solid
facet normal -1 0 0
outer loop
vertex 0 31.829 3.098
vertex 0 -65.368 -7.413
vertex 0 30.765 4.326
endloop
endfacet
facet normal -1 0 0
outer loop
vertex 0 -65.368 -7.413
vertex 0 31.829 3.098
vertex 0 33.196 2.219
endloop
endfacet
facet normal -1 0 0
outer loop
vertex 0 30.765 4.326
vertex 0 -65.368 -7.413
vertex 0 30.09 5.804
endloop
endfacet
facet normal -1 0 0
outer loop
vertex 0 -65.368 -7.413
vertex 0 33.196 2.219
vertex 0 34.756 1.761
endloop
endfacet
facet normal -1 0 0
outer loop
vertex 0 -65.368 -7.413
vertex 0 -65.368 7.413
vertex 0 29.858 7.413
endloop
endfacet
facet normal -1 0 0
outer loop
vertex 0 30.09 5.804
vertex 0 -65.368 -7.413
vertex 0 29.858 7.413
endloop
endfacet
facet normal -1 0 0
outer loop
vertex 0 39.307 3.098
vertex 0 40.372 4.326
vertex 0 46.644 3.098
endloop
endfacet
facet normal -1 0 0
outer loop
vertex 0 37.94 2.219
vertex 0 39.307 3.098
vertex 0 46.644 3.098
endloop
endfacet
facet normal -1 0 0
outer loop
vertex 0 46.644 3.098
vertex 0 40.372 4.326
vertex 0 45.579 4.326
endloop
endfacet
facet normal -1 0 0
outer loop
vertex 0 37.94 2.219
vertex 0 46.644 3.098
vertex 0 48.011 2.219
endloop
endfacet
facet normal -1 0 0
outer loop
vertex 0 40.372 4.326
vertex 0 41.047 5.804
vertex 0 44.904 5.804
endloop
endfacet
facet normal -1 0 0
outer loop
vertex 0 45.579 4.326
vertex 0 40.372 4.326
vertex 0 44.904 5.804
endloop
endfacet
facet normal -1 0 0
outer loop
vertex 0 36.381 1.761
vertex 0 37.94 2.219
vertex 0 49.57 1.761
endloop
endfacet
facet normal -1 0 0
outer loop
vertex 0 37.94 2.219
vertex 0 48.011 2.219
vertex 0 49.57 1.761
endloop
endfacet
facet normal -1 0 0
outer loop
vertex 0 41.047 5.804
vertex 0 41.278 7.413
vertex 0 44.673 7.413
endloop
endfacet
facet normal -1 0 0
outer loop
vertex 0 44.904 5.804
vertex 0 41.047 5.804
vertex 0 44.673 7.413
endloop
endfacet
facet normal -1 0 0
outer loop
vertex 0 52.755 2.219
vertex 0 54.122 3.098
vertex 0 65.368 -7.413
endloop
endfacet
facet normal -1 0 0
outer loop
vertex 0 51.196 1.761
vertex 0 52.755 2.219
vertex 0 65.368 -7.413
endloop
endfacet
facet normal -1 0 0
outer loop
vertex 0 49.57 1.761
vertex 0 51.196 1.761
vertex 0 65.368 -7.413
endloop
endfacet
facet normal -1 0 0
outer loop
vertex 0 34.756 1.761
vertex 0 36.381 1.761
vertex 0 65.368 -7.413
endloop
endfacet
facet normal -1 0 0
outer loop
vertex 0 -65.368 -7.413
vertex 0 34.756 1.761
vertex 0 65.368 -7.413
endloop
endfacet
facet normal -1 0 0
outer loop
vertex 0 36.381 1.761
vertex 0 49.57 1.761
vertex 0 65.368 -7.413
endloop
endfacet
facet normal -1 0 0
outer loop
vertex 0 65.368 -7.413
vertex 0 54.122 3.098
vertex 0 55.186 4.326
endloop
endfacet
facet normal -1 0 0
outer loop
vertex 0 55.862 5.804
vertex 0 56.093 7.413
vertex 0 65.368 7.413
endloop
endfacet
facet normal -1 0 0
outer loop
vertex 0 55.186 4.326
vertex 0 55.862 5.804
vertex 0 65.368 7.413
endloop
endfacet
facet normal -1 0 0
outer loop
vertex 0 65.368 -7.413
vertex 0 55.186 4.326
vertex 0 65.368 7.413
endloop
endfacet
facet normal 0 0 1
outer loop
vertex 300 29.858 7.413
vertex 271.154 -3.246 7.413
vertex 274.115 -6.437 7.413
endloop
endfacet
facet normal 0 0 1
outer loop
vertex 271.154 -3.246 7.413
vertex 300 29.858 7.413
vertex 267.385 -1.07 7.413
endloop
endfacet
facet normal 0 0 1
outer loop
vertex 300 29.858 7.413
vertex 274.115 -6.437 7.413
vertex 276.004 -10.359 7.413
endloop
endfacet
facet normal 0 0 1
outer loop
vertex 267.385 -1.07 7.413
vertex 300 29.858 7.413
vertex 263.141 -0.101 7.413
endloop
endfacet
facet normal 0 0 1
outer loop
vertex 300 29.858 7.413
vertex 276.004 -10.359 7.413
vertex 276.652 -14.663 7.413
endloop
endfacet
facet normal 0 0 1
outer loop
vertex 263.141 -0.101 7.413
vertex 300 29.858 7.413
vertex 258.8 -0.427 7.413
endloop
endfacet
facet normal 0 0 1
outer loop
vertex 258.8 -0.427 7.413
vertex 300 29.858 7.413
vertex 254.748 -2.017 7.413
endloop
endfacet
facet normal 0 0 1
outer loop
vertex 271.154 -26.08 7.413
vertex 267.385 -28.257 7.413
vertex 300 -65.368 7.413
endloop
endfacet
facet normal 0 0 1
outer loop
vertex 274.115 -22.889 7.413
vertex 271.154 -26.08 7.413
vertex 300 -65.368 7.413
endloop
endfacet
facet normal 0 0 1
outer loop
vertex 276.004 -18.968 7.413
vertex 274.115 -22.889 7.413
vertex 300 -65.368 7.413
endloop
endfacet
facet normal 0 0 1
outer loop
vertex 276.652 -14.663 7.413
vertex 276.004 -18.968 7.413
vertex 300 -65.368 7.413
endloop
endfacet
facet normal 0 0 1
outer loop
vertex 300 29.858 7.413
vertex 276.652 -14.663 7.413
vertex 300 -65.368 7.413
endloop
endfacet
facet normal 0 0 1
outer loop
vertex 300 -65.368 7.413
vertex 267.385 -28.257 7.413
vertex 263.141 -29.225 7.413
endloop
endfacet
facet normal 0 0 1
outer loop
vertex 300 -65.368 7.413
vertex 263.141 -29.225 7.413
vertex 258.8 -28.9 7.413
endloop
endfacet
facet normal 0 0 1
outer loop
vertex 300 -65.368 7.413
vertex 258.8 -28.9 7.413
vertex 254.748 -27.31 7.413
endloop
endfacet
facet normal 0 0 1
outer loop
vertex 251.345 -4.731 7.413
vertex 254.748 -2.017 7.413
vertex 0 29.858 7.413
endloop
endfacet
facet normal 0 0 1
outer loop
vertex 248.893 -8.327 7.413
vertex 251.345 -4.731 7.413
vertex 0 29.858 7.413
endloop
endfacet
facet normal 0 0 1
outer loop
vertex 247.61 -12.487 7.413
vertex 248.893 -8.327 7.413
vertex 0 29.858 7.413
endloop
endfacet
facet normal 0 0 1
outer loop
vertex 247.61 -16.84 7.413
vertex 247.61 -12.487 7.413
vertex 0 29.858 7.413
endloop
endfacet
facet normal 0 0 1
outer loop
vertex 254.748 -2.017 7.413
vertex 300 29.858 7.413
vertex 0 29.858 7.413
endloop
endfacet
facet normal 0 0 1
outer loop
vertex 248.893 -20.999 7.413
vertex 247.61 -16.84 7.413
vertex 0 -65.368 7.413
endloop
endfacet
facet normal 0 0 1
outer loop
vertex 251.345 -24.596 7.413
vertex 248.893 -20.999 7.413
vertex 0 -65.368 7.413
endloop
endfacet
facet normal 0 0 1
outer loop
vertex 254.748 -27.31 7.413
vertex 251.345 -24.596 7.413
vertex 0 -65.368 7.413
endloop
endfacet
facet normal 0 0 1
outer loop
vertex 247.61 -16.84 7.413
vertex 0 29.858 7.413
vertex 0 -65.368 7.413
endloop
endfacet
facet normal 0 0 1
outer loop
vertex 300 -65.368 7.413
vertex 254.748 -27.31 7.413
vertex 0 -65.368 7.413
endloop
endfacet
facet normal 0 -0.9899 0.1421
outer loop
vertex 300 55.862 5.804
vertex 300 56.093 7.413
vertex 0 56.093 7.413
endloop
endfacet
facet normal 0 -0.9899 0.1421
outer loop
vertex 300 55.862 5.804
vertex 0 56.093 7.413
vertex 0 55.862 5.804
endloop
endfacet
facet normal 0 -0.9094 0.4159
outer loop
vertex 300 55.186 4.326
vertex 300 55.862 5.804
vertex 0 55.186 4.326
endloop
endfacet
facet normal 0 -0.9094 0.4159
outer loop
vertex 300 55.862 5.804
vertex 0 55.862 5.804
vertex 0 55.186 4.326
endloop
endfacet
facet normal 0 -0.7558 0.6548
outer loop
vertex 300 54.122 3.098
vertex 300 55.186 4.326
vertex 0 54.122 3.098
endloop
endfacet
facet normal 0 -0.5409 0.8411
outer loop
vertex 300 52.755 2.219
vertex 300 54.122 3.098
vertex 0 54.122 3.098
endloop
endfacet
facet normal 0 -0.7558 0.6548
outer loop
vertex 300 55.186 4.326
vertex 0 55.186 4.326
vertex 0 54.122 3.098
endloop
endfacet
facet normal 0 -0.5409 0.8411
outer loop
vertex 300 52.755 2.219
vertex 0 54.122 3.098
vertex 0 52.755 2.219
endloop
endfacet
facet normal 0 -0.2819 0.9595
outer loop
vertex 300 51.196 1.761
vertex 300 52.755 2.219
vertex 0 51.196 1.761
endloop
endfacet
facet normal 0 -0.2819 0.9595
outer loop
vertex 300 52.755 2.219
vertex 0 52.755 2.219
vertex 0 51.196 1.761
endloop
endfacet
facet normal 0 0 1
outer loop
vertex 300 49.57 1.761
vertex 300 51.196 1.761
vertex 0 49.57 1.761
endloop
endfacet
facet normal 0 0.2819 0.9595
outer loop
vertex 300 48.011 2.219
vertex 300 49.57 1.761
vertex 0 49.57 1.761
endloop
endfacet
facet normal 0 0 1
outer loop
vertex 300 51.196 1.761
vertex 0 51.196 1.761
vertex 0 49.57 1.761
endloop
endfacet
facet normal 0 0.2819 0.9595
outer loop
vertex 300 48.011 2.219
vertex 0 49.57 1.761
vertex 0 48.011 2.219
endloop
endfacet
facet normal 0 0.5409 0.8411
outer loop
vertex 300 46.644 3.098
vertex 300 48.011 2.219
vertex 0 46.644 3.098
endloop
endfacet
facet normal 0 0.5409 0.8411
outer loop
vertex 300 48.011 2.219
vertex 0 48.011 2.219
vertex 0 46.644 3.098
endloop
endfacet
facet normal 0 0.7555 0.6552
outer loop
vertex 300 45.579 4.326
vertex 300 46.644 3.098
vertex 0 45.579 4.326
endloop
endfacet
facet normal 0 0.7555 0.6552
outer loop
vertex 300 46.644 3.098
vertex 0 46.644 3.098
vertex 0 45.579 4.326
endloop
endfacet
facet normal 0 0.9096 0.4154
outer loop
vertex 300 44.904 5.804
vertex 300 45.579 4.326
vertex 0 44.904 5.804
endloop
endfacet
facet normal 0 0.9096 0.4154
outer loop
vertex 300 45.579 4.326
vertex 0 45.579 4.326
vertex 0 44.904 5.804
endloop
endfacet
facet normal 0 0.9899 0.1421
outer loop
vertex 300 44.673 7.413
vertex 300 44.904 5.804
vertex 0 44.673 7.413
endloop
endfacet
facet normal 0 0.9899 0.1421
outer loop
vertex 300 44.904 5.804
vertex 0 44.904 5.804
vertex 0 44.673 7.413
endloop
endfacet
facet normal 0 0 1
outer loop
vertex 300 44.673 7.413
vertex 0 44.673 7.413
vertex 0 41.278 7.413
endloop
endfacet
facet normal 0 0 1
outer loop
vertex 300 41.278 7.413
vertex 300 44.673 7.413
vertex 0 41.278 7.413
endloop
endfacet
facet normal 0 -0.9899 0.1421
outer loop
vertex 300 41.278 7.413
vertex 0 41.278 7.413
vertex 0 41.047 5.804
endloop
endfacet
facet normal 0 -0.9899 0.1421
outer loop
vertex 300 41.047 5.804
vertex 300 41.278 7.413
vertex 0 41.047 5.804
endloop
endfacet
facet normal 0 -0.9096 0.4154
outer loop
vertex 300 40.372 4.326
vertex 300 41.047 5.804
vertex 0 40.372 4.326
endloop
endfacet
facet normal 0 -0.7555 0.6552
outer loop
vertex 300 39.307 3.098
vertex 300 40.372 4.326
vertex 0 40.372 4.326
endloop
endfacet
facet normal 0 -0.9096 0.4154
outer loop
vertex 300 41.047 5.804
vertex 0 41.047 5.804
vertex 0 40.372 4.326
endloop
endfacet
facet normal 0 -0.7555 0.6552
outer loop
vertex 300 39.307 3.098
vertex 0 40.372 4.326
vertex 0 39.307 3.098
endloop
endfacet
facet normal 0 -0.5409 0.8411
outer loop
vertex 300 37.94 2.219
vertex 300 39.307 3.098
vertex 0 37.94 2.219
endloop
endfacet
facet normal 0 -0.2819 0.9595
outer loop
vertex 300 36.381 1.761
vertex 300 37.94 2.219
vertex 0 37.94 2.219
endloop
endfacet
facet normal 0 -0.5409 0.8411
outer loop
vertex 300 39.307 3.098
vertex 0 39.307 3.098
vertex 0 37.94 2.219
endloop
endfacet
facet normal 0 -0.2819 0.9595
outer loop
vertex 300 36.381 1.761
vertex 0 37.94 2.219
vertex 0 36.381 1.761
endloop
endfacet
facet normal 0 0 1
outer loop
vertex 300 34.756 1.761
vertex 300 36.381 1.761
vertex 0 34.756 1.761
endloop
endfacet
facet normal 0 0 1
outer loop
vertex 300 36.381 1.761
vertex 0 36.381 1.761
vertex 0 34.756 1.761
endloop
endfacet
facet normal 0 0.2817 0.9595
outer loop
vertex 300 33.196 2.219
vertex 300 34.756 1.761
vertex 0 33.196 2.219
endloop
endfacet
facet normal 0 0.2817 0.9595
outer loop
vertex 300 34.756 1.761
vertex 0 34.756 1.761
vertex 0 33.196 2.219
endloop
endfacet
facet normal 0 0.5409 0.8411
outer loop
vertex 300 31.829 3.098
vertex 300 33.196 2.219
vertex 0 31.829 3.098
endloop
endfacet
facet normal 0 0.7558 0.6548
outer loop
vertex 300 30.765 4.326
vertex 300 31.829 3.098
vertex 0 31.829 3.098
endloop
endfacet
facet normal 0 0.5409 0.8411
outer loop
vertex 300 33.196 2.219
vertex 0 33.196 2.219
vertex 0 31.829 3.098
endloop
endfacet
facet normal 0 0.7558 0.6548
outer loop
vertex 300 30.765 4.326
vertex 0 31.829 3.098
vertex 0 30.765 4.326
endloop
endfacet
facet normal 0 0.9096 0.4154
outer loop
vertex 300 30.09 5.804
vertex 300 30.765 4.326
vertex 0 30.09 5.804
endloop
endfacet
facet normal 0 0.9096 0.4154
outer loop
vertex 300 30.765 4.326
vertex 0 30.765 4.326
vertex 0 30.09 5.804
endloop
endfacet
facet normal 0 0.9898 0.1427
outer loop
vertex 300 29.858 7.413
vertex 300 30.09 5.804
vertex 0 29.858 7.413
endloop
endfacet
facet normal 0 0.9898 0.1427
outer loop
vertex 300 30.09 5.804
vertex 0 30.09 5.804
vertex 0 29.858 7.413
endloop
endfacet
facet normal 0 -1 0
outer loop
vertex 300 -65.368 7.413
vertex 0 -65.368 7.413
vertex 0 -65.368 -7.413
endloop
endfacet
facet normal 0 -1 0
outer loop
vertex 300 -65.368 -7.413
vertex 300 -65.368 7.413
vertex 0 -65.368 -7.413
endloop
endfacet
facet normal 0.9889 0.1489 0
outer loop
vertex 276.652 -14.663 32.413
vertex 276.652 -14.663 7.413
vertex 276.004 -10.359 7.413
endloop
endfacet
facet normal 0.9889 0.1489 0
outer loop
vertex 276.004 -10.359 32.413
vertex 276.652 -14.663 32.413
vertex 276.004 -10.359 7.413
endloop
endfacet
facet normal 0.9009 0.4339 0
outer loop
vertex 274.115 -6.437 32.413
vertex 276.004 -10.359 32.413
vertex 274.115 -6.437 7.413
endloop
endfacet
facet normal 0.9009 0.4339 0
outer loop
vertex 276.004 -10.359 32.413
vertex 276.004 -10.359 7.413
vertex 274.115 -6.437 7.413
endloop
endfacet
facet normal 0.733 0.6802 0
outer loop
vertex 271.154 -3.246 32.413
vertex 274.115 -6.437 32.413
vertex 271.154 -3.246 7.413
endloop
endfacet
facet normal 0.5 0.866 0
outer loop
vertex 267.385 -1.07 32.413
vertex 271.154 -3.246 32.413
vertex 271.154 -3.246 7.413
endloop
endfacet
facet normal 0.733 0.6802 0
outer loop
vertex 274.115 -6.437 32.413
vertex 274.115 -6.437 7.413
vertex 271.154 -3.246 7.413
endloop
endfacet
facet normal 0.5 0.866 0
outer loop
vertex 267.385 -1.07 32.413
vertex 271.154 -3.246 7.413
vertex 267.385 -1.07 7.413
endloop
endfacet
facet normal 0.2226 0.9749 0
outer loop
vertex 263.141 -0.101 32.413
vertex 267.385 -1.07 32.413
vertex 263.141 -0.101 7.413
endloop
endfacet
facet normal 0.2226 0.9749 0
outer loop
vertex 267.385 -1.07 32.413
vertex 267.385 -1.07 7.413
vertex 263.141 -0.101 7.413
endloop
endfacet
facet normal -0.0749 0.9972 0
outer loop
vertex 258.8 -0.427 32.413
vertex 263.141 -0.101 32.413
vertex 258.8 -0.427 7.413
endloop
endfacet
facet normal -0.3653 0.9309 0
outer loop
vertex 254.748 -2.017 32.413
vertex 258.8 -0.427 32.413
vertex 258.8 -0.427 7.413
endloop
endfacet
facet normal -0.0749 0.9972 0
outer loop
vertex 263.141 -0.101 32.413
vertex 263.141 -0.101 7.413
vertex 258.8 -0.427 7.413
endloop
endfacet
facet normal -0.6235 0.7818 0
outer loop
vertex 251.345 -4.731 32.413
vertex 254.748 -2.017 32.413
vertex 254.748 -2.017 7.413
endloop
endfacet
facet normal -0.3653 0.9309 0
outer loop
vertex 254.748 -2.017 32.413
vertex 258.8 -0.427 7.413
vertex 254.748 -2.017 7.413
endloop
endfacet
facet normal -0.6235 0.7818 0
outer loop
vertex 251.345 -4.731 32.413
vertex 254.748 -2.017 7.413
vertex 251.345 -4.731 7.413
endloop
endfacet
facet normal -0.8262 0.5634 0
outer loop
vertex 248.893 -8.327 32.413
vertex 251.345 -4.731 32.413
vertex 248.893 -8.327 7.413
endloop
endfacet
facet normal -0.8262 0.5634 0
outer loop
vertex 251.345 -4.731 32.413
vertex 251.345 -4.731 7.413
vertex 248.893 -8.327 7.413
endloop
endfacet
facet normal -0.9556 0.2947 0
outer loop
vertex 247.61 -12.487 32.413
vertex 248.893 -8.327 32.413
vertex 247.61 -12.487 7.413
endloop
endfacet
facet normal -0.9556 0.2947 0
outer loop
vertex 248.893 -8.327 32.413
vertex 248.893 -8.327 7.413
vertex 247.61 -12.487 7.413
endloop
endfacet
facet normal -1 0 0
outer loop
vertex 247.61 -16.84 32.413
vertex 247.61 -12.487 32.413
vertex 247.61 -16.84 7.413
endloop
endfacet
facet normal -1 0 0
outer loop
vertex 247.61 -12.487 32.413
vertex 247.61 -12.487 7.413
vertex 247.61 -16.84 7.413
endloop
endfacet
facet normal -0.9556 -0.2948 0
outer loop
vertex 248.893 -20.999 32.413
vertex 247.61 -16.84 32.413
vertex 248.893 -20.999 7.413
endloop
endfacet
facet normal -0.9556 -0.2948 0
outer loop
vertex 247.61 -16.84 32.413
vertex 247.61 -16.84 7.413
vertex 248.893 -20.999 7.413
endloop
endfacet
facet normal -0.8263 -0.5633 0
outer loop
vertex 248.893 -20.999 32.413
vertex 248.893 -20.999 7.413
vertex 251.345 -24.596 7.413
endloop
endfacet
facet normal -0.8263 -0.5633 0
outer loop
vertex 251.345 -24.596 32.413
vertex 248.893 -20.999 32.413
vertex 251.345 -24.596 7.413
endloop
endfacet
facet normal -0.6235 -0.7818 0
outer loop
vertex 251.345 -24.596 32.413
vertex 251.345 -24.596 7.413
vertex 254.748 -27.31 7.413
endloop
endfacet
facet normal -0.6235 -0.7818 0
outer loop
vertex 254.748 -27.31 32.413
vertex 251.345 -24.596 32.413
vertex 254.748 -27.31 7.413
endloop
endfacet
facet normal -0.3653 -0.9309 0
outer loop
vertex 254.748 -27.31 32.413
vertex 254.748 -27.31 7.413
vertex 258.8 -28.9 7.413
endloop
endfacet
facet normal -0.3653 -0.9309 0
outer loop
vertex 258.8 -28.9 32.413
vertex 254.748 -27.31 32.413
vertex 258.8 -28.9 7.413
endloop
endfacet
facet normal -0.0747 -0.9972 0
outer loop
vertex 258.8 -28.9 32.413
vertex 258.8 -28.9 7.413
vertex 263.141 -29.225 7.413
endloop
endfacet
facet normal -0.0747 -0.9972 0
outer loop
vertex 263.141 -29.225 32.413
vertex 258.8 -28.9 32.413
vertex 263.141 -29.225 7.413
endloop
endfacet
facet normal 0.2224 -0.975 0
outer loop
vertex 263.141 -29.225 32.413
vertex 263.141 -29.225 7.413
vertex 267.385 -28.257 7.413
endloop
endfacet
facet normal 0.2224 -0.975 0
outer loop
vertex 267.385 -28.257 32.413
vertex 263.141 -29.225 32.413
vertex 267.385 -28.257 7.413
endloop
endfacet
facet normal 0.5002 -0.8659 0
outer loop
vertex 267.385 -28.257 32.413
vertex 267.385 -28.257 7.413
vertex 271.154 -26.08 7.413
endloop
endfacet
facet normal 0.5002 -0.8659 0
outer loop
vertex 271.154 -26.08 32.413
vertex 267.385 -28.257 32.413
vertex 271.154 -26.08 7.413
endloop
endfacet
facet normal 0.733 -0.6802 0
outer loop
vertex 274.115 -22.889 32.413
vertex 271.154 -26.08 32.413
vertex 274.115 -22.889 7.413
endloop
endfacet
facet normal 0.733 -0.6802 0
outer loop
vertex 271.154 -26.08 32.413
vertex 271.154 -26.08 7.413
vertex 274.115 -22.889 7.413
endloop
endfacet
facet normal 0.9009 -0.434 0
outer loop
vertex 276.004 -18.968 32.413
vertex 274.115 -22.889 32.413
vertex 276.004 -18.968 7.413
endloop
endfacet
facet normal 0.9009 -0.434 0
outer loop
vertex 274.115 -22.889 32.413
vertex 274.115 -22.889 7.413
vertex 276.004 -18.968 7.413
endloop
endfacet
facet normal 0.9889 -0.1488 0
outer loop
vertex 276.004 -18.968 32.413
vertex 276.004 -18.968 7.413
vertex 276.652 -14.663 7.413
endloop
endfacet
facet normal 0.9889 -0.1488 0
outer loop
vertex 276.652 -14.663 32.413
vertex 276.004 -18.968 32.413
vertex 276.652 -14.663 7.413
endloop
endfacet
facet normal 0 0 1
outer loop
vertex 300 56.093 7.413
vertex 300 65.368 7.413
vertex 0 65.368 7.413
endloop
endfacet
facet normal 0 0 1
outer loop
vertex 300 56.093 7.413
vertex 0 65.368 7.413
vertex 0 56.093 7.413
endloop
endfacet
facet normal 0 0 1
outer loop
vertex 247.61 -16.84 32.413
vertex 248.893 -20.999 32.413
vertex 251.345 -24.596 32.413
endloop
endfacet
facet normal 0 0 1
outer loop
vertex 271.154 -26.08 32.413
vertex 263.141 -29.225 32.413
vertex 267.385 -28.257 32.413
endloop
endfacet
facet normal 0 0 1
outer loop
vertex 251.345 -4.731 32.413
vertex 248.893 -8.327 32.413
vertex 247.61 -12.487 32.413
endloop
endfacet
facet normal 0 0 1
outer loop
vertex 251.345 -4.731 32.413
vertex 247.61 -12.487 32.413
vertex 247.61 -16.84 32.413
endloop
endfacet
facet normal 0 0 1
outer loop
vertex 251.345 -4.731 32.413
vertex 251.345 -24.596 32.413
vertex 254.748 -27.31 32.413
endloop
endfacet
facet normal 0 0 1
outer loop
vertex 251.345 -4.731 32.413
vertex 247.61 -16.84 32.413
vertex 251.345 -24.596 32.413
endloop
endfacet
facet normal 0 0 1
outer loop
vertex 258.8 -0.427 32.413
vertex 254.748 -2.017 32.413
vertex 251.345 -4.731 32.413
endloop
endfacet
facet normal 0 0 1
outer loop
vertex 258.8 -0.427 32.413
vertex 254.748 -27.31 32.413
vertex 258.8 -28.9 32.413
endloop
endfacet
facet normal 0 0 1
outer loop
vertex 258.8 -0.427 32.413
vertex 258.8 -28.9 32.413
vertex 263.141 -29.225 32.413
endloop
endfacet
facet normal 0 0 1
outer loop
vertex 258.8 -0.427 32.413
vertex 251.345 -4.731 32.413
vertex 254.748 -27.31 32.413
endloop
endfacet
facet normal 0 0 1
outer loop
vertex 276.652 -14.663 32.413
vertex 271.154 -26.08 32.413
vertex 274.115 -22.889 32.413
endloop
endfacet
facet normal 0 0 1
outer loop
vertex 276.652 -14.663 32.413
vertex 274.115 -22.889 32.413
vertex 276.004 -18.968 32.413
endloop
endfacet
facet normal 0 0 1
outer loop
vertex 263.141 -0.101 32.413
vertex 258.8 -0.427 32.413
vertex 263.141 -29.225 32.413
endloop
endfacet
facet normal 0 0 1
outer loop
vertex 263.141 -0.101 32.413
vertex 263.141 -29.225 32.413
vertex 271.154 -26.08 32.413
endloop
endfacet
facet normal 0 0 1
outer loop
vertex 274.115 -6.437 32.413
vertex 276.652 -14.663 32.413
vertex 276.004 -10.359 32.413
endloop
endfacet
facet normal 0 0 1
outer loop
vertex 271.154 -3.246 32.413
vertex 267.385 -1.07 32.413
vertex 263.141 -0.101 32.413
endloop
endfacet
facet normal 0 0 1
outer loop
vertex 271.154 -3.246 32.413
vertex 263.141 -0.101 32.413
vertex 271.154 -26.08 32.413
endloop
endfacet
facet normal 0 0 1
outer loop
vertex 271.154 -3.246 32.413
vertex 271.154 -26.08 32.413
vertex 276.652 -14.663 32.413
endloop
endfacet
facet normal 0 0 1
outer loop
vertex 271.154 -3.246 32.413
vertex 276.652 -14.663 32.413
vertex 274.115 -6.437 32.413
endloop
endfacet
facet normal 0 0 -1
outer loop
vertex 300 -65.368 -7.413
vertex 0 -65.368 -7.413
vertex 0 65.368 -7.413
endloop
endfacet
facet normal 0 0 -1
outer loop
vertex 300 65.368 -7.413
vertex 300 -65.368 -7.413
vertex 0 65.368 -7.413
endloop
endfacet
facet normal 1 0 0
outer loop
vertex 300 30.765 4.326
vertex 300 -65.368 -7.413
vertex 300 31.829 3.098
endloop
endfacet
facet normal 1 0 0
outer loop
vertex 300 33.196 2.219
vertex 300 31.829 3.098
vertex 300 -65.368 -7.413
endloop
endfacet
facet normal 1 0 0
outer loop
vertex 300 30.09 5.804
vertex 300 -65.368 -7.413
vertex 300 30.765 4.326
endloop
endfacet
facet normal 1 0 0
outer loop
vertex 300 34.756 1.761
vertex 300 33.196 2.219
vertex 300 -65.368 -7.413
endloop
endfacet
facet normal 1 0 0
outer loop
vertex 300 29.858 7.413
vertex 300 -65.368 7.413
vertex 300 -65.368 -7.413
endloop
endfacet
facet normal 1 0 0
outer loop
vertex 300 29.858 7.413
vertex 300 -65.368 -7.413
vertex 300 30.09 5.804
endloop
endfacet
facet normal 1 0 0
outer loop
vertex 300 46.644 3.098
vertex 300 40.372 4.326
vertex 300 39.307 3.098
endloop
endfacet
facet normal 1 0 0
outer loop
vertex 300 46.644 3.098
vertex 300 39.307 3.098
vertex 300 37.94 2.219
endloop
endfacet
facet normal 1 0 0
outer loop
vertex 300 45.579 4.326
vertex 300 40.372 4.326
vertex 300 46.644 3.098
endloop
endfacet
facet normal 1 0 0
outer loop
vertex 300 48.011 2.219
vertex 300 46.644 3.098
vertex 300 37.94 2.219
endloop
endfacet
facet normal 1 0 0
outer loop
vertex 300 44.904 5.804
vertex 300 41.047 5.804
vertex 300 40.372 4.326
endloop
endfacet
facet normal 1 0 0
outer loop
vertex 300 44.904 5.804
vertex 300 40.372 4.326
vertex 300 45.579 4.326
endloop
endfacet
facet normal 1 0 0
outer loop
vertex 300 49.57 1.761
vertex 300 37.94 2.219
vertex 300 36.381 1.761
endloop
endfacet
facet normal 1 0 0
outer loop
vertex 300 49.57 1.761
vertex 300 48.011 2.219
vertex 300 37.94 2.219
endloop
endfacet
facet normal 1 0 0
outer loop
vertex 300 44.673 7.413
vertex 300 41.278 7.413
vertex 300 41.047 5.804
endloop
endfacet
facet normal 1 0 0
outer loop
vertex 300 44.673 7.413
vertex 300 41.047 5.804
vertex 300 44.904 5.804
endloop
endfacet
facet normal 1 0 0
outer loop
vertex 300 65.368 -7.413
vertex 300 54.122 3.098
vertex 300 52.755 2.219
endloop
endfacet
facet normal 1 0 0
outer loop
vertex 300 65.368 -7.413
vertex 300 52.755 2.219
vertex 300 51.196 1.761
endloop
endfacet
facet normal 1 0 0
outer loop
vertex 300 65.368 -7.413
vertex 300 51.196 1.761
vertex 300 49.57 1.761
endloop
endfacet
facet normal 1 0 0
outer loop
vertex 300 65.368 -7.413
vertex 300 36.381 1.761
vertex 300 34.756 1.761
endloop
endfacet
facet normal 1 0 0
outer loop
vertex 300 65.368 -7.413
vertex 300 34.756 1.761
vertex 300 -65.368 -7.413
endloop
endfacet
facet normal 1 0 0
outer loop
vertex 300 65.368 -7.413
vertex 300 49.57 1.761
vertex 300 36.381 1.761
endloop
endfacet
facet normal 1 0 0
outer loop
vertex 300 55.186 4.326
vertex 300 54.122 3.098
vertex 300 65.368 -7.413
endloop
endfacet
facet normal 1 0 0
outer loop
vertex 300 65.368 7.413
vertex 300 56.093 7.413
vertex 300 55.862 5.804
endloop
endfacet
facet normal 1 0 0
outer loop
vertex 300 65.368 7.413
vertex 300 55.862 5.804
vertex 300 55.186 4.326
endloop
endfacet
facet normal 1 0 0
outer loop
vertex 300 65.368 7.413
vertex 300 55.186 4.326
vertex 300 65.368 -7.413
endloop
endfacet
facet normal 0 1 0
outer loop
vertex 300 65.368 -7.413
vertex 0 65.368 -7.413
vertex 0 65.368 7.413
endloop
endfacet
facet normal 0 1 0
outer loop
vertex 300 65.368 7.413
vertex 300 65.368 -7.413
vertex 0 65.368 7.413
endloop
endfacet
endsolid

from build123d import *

# Parameters (mm, degrees)
F1_DEPTH = 300
F2_R     = 14.602724
F3_DEPTH = 25


with BuildPart() as f1:
    # F0 (on Right) → F1 (new body)
    with BuildSketch(Plane.YZ):
        with BuildLine():
            Line((29.858291, 7.412897), (-65.36828, 7.412897))
            Line((-65.36828, 7.412897), (-65.36828, -7.412897))
            Line((-65.36828, -7.412897), (65.36828, -7.412897))
            Line((65.36828, -7.412897), (65.36828, 7.412897))
            Line((65.36828, 7.412897), (56.092858, 7.412897))
            ThreePointArc((56.092858, 7.412897), (50.38289, 1.702929), (44.672921, 7.412897))
            Line((44.672921, 7.412897), (41.278228, 7.412897))
            ThreePointArc((41.278228, 7.412897), (35.56826, 1.702929), (29.858291, 7.412897))
        make_face()
    extrude(amount=F1_DEPTH)

    # F2 (on face) → F3 (join)
    with BuildSketch(Plane.XY.offset(7.412897)):
        with Locations((262.049705, -14.663358)):
            Circle(F2_R)
    extrude(amount=F3_DEPTH)


solid = f1.part
